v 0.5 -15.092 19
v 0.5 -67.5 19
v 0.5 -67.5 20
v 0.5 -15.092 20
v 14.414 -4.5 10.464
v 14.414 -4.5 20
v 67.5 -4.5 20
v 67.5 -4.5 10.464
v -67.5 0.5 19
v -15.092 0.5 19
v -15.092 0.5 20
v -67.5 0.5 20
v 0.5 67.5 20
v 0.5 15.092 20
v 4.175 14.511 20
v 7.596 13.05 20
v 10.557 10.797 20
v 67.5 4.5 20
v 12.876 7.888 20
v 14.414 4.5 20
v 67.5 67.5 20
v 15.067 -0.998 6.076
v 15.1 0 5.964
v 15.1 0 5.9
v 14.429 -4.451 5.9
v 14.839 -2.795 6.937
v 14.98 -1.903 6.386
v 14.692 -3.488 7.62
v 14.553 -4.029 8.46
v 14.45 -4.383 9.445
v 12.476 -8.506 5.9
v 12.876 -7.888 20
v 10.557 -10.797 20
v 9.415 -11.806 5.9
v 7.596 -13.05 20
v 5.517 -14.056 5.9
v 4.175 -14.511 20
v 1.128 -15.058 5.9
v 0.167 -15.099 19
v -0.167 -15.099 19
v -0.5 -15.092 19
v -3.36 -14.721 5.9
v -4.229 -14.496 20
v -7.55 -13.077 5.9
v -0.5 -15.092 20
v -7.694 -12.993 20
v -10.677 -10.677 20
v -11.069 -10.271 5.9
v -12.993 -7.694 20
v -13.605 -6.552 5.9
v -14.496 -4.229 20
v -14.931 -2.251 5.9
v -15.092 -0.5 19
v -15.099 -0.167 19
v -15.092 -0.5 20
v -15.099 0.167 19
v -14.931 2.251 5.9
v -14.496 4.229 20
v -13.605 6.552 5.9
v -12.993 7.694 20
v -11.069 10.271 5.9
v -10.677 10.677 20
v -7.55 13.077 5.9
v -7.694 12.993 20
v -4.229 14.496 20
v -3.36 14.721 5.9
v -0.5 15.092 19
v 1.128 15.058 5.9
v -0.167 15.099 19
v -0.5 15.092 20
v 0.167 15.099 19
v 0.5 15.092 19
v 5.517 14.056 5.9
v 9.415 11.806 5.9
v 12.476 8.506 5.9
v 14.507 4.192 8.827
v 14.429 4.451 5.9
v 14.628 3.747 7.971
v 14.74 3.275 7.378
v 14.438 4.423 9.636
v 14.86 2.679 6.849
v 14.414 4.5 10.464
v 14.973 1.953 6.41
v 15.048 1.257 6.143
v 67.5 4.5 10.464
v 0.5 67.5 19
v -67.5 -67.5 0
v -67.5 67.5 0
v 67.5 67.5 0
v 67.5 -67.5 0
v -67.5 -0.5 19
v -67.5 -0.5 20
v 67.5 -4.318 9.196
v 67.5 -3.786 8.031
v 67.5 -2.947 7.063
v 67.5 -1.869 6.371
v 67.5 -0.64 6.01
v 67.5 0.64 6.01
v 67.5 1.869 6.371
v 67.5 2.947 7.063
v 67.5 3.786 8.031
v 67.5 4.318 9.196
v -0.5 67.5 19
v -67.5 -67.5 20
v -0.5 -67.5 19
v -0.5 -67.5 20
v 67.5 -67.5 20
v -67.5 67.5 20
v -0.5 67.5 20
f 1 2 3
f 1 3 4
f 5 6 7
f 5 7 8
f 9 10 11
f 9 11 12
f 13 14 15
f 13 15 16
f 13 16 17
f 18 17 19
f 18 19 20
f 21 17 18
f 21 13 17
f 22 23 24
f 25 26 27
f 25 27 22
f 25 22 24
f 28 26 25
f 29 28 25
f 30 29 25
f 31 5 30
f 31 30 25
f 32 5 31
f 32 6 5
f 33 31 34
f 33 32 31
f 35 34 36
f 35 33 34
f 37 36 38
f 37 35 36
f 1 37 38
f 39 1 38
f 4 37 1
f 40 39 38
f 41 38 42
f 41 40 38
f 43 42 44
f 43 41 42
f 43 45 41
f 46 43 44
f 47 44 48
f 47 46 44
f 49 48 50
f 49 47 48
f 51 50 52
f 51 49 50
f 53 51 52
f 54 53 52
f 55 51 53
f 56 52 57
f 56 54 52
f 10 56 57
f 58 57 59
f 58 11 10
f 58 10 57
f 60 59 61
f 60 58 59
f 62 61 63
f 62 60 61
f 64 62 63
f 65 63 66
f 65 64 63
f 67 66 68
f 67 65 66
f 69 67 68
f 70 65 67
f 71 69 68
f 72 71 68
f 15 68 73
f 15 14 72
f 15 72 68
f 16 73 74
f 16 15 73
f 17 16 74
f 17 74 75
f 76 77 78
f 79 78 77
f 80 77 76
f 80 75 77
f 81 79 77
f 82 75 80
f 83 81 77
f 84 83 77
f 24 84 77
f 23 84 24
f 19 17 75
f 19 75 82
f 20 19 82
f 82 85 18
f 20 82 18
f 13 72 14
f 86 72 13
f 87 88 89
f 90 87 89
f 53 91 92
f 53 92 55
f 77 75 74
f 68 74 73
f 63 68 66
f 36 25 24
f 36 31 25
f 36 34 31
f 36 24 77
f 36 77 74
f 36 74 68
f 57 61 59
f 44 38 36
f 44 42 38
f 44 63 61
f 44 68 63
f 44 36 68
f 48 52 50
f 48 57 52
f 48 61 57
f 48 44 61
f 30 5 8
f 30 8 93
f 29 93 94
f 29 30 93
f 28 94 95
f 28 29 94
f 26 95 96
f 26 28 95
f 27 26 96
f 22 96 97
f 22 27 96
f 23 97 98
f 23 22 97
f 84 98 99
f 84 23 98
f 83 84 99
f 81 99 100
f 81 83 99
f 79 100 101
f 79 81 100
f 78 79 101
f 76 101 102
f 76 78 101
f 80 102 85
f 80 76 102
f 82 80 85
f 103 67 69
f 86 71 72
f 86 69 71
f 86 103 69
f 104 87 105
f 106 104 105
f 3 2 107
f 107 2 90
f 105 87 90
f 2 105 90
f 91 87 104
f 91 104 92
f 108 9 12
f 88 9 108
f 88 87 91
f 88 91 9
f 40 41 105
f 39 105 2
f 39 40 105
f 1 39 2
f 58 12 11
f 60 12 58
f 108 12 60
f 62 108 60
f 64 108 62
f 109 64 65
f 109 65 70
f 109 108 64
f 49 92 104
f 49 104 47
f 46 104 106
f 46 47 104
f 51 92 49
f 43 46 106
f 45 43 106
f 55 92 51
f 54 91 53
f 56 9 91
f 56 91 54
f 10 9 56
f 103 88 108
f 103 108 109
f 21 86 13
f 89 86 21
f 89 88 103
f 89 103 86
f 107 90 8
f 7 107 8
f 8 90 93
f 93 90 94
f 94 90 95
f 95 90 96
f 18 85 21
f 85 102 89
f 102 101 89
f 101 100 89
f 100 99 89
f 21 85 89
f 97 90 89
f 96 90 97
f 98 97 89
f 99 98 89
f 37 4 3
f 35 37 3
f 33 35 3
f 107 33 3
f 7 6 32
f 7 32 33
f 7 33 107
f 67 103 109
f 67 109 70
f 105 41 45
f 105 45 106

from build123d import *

# Parameters (mm, degrees)
F3_W     = 135
F3_H     = 135
F4_DEPTH = 20
F0_W     = 15.1
F0_H     = 14.1
F6_START = 14
F6_DEPTH = 136
F7_START = 19
F7_DEPTH = 6


with BuildPart() as f4:
    # F3 (on Top) → F4 (new body)
    with BuildSketch(Plane.XY):
        Rectangle(F3_W, F3_H)
    extrude(amount=F4_DEPTH)

    # F0 (on Front) → F5 (revolve, cut)
    with BuildSketch(Plane.XZ):
        with Locations((7.55, 12.95)):
            Rectangle(F0_W, F0_H)
    revolve(axis=Axis((0, 0, 12.95), (0, 0, -1)), mode=Mode.SUBTRACT)

    # F1 (on Right) → F6 (cut)
    with BuildSketch(Plane.YZ.offset(F6_START)):
        with BuildLine():
            Line((4.5, 20.4638522118), (0, 20.4638522118))
            Line((0, 20.4638522118), (-4.5, 20.4638522118))
            Line((-4.5, 20.4638522118), (-4.5, 10.4638522118))
            ThreePointArc((-4.5, 10.4638522118), (0, 5.9638522118), (4.5, 10.4638522118))
            Line((4.5, 10.4638522118), (4.5, 20.4638522118))
        make_face()
    extrude(amount=F6_DEPTH, mode=Mode.SUBTRACT)

    # F2 (on Top) → F7 (cut)
    with BuildSketch(Plane.XY.offset(F7_START)):
        Polygon((14, 0.5), (14, 0), (14, -0.5), (74, -0.5), (74, 0.5), align=None)
        Polygon((0.5, -14), (0, -14), (-0.5, -14), (-0.5, -74), (0.5, -74), align=None)
        Polygon((-13.9910685796, -0.5), (-13.9910685796, 0), (-13.9910685796, 0.5), (-73.9910685796, 0.5), (-73.9910685796, -0.5), align=None)
        Polygon((-0.5, 73.9972595498), (-0.5, 13.9972595498), (0, 13.9972595498), (0.5, 13.9972595498), (0.5, 73.9972595498), align=None)
    extrude(amount=F7_DEPTH, mode=Mode.SUBTRACT)


solid = f4.part
